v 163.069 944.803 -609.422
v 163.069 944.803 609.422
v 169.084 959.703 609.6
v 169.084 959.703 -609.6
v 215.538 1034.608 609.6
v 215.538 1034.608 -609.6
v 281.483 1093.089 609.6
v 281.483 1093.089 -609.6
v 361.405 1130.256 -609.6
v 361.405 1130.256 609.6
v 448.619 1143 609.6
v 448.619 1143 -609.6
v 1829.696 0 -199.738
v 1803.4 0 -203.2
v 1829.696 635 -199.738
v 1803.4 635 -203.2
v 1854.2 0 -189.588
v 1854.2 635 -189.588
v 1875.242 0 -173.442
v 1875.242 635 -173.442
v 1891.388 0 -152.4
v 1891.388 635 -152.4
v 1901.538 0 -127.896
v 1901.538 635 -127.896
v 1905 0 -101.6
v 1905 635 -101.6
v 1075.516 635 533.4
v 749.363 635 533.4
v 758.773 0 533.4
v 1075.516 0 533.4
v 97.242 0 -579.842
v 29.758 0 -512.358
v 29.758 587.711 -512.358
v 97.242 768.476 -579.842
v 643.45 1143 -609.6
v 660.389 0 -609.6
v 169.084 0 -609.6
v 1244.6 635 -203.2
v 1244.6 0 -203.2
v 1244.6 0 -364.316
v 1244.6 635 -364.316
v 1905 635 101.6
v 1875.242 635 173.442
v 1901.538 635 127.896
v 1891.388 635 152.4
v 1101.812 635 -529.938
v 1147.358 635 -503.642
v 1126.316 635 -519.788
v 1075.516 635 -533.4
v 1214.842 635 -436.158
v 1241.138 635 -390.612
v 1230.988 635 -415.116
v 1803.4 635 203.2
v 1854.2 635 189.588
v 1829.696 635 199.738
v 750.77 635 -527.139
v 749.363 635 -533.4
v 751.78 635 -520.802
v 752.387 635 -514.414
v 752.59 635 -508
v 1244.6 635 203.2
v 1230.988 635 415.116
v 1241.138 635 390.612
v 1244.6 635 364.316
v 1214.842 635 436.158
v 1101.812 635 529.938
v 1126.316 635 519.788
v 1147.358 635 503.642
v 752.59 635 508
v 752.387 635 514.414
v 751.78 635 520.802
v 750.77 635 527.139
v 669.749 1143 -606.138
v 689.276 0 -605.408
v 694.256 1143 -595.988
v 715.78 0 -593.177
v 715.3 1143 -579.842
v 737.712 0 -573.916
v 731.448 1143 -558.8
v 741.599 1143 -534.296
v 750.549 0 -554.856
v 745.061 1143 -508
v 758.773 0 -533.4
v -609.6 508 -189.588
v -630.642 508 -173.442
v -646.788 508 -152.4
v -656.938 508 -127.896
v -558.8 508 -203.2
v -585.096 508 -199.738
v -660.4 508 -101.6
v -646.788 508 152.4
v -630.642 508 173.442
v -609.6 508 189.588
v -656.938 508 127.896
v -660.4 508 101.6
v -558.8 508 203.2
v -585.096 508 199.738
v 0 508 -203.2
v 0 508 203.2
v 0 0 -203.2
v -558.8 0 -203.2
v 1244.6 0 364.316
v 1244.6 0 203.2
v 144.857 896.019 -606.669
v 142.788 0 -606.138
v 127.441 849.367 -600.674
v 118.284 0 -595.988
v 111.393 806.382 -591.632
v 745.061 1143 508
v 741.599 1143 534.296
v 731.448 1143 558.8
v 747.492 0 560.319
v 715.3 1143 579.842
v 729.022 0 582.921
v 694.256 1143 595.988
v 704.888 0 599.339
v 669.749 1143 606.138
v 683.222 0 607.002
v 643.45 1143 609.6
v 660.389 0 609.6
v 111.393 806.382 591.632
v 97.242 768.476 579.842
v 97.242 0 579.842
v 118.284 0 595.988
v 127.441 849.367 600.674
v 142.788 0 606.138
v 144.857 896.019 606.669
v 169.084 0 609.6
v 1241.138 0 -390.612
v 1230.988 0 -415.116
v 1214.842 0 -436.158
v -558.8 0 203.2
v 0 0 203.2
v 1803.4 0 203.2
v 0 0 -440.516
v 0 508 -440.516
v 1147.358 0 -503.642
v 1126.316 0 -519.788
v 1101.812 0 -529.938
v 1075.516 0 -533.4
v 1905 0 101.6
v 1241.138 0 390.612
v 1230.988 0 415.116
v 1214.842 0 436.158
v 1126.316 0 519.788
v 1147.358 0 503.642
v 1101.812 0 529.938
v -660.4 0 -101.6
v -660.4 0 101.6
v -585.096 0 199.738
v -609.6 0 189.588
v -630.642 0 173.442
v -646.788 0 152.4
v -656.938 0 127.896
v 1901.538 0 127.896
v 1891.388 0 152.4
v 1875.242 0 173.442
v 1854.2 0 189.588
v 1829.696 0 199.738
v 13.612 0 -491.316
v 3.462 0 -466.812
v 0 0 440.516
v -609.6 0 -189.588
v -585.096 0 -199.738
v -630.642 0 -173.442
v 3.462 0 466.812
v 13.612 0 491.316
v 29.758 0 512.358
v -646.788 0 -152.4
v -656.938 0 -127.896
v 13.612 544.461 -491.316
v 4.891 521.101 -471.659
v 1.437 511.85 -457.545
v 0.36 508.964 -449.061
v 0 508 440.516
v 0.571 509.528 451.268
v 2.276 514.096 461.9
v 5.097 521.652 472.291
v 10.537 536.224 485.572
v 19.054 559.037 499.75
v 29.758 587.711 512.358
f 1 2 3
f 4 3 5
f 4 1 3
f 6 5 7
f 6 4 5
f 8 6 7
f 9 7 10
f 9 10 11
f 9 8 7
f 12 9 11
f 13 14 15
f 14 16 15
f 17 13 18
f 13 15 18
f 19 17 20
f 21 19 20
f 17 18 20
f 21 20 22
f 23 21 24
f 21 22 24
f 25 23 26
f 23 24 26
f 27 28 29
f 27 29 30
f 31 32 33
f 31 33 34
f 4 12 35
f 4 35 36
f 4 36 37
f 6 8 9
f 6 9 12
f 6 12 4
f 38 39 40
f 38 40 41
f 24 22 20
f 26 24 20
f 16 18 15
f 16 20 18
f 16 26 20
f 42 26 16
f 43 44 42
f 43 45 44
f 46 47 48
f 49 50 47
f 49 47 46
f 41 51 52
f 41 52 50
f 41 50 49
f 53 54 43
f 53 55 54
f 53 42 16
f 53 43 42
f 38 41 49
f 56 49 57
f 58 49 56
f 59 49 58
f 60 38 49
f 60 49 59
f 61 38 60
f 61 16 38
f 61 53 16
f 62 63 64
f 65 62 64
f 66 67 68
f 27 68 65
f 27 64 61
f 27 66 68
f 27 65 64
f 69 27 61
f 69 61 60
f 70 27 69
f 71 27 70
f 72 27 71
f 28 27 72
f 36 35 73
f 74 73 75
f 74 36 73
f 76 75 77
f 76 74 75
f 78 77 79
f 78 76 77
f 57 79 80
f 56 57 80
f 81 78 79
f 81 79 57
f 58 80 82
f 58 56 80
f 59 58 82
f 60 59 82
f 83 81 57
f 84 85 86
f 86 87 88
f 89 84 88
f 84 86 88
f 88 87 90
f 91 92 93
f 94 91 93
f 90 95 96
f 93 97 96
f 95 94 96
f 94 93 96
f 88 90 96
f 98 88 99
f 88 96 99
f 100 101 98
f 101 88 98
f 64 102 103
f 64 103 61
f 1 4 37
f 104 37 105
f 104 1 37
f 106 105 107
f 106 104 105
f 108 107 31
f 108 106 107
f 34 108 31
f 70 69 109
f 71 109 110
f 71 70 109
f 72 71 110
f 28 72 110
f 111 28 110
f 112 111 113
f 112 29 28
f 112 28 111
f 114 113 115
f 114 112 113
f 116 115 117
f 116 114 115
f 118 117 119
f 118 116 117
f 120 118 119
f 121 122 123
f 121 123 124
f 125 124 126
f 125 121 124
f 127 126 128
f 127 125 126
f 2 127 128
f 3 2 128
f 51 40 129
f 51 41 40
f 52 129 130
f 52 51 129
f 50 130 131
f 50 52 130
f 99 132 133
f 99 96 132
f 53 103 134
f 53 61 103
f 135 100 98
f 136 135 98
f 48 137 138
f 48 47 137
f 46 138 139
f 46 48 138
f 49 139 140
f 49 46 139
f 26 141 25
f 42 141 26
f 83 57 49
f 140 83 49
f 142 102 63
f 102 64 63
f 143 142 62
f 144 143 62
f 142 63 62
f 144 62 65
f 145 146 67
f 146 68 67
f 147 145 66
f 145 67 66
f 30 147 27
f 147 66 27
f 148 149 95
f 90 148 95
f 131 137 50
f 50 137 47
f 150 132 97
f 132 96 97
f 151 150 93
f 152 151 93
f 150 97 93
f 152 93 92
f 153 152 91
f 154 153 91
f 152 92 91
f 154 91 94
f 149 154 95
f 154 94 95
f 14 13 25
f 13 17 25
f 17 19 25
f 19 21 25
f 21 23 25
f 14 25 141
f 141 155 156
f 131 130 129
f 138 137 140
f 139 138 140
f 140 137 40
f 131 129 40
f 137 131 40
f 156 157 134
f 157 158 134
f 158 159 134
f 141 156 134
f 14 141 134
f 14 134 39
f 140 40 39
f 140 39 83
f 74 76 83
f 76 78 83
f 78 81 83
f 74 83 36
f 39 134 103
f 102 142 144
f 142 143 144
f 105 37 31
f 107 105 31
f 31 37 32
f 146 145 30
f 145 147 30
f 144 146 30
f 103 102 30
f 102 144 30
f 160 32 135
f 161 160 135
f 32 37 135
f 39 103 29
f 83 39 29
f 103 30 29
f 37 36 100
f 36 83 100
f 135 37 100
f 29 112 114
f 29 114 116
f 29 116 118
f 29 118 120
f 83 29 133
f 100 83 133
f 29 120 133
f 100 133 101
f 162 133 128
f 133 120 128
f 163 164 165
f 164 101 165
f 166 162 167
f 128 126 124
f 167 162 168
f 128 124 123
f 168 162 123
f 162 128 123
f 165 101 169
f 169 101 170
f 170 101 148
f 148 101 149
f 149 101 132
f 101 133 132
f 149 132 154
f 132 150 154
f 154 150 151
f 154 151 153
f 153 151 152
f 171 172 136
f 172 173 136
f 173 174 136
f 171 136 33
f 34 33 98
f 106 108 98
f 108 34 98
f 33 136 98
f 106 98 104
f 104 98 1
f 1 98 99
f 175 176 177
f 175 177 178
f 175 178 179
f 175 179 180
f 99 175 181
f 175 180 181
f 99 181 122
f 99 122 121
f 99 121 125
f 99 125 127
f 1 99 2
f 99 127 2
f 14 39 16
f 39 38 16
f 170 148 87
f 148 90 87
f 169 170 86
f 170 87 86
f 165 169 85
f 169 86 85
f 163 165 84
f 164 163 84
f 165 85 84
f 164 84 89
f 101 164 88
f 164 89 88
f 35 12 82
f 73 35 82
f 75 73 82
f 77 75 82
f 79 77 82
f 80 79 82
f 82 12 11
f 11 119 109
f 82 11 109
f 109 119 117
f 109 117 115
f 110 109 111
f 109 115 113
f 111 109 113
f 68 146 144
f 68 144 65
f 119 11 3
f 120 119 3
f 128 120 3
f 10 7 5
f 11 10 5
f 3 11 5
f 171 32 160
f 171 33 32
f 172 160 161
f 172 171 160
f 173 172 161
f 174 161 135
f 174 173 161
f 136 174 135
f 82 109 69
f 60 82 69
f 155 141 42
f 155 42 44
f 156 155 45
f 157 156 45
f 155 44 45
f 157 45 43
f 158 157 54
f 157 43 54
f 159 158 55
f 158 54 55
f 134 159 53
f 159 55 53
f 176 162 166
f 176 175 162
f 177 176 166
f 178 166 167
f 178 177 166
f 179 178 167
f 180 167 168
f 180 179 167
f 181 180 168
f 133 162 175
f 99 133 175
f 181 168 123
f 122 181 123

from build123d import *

# Parameters (mm, degrees)
SKETCH2_W           = 660.4
SKETCH2_H           = 508
BOSS_EXTRUDE1_DEPTH = 406.4
BOSS_EXTRUDE2_DEPTH = 1219.2
BOSS_EXTRUDE3_DEPTH = 1066.8
SKETCH5_W           = 660.4
SKETCH5_H           = 635
BOSS_EXTRUDE4_DEPTH = 406.4
FILLET2_R           = 101.6
FILLET3_R           = 101.6
CHAMFER1_SIZE       = 127
FILLET4_R           = 101.6
CHAMFER3_SIZE       = 127
FILLET5_R           = 101.6
FILLET6_R           = 304.8


with BuildPart() as part:
    # Sketch2 → Boss-Extrude1 (new body)
    with BuildSketch(Plane.XY.offset(203.2)):
        with Locations((-330.2, 254)):
            Rectangle(SKETCH2_W, SKETCH2_H)
    extrude(amount=-BOSS_EXTRUDE1_DEPTH)

    # Sketch3 → Boss-Extrude2 (add)
    with BuildSketch(Plane.XY.offset(609.6)):
        Polygon((0, 0), (0, 508), (237.061244979, 1143), (745.061244979, 1143), (762, 0), align=None)
    extrude(amount=-BOSS_EXTRUDE2_DEPTH)

    # Sketch4 → Boss-Extrude3 (add)
    with BuildSketch(Plane.XY.offset(533.4)):
        Polygon((1244.6, 635), (752.589580544, 635), (762, 0), (1244.6, 0), align=None)
    extrude(amount=-BOSS_EXTRUDE3_DEPTH)

    # Sketch5 → Boss-Extrude4 (add)
    with BuildSketch(Plane.XY.offset(203.2)):
        with Locations((1574.8, 317.5)):
            Rectangle(SKETCH5_W, SKETCH5_H)
    extrude(amount=-BOSS_EXTRUDE4_DEPTH)

    # Fillet2
    fillet2_edges = [part.edges().sort_by_distance(p)[0] for p in [
        (-660.4, 254, -203.2),
        (-660.4, 254, 203.2),
    ]]
    fillet(fillet2_edges, radius=FILLET2_R)

    # Fillet3
    fillet3_edges = [part.edges().sort_by_distance(p)[0] for p in [
        (1905, 317.5, -203.2),
        (1905, 317.5, 203.2),
    ]]
    fillet(fillet3_edges, radius=FILLET3_R)

    # Chamfer1
    chamfer1_edges = [part.edges().sort_by_distance(p)[0] for p in [
        (1244.6, 317.5, -533.4),
        (1244.6, 317.5, 533.4),
    ]]
    chamfer(chamfer1_edges, length=CHAMFER1_SIZE)

    # Fillet4
    fillet4_edges = [part.edges().sort_by_distance(p)[0] for p in [
        (1244.6, 317.5, -406.4),
        (1117.6, 317.5, -533.4),
        (1117.6, 317.5, 533.4),
        (1244.6, 317.5, 406.4),
    ]]
    fillet(fillet4_edges, radius=FILLET4_R)

    # Chamfer3
    chamfer3_edges = [part.edges().sort_by_distance(p)[0] for p in [
        (0, 254, -609.6),
        (0, 254, 609.6),
    ]]
    chamfer(chamfer3_edges, length=CHAMFER3_SIZE)

    # Fillet5
    fillet5_edges = [part.edges().sort_by_distance(p)[0] for p in [
        (753.530622489, 571.5, 609.6),
        (753.530622489, 571.5, -609.6),
        (127, 424.093175726, -609.6),
        (0, 254, -482.6),
        (127, 424.093175726, 609.6),
        (0, 254, 482.6),
    ]]
    fillet(fillet5_edges, radius=FILLET5_R)

    # Fillet6
    fillet6_edges = [part.edges().sort_by_distance(p)[0] for p in [
        (237.061244979, 1143, 0),
    ]]
    fillet(fillet6_edges, radius=FILLET6_R)


solid = part.part
